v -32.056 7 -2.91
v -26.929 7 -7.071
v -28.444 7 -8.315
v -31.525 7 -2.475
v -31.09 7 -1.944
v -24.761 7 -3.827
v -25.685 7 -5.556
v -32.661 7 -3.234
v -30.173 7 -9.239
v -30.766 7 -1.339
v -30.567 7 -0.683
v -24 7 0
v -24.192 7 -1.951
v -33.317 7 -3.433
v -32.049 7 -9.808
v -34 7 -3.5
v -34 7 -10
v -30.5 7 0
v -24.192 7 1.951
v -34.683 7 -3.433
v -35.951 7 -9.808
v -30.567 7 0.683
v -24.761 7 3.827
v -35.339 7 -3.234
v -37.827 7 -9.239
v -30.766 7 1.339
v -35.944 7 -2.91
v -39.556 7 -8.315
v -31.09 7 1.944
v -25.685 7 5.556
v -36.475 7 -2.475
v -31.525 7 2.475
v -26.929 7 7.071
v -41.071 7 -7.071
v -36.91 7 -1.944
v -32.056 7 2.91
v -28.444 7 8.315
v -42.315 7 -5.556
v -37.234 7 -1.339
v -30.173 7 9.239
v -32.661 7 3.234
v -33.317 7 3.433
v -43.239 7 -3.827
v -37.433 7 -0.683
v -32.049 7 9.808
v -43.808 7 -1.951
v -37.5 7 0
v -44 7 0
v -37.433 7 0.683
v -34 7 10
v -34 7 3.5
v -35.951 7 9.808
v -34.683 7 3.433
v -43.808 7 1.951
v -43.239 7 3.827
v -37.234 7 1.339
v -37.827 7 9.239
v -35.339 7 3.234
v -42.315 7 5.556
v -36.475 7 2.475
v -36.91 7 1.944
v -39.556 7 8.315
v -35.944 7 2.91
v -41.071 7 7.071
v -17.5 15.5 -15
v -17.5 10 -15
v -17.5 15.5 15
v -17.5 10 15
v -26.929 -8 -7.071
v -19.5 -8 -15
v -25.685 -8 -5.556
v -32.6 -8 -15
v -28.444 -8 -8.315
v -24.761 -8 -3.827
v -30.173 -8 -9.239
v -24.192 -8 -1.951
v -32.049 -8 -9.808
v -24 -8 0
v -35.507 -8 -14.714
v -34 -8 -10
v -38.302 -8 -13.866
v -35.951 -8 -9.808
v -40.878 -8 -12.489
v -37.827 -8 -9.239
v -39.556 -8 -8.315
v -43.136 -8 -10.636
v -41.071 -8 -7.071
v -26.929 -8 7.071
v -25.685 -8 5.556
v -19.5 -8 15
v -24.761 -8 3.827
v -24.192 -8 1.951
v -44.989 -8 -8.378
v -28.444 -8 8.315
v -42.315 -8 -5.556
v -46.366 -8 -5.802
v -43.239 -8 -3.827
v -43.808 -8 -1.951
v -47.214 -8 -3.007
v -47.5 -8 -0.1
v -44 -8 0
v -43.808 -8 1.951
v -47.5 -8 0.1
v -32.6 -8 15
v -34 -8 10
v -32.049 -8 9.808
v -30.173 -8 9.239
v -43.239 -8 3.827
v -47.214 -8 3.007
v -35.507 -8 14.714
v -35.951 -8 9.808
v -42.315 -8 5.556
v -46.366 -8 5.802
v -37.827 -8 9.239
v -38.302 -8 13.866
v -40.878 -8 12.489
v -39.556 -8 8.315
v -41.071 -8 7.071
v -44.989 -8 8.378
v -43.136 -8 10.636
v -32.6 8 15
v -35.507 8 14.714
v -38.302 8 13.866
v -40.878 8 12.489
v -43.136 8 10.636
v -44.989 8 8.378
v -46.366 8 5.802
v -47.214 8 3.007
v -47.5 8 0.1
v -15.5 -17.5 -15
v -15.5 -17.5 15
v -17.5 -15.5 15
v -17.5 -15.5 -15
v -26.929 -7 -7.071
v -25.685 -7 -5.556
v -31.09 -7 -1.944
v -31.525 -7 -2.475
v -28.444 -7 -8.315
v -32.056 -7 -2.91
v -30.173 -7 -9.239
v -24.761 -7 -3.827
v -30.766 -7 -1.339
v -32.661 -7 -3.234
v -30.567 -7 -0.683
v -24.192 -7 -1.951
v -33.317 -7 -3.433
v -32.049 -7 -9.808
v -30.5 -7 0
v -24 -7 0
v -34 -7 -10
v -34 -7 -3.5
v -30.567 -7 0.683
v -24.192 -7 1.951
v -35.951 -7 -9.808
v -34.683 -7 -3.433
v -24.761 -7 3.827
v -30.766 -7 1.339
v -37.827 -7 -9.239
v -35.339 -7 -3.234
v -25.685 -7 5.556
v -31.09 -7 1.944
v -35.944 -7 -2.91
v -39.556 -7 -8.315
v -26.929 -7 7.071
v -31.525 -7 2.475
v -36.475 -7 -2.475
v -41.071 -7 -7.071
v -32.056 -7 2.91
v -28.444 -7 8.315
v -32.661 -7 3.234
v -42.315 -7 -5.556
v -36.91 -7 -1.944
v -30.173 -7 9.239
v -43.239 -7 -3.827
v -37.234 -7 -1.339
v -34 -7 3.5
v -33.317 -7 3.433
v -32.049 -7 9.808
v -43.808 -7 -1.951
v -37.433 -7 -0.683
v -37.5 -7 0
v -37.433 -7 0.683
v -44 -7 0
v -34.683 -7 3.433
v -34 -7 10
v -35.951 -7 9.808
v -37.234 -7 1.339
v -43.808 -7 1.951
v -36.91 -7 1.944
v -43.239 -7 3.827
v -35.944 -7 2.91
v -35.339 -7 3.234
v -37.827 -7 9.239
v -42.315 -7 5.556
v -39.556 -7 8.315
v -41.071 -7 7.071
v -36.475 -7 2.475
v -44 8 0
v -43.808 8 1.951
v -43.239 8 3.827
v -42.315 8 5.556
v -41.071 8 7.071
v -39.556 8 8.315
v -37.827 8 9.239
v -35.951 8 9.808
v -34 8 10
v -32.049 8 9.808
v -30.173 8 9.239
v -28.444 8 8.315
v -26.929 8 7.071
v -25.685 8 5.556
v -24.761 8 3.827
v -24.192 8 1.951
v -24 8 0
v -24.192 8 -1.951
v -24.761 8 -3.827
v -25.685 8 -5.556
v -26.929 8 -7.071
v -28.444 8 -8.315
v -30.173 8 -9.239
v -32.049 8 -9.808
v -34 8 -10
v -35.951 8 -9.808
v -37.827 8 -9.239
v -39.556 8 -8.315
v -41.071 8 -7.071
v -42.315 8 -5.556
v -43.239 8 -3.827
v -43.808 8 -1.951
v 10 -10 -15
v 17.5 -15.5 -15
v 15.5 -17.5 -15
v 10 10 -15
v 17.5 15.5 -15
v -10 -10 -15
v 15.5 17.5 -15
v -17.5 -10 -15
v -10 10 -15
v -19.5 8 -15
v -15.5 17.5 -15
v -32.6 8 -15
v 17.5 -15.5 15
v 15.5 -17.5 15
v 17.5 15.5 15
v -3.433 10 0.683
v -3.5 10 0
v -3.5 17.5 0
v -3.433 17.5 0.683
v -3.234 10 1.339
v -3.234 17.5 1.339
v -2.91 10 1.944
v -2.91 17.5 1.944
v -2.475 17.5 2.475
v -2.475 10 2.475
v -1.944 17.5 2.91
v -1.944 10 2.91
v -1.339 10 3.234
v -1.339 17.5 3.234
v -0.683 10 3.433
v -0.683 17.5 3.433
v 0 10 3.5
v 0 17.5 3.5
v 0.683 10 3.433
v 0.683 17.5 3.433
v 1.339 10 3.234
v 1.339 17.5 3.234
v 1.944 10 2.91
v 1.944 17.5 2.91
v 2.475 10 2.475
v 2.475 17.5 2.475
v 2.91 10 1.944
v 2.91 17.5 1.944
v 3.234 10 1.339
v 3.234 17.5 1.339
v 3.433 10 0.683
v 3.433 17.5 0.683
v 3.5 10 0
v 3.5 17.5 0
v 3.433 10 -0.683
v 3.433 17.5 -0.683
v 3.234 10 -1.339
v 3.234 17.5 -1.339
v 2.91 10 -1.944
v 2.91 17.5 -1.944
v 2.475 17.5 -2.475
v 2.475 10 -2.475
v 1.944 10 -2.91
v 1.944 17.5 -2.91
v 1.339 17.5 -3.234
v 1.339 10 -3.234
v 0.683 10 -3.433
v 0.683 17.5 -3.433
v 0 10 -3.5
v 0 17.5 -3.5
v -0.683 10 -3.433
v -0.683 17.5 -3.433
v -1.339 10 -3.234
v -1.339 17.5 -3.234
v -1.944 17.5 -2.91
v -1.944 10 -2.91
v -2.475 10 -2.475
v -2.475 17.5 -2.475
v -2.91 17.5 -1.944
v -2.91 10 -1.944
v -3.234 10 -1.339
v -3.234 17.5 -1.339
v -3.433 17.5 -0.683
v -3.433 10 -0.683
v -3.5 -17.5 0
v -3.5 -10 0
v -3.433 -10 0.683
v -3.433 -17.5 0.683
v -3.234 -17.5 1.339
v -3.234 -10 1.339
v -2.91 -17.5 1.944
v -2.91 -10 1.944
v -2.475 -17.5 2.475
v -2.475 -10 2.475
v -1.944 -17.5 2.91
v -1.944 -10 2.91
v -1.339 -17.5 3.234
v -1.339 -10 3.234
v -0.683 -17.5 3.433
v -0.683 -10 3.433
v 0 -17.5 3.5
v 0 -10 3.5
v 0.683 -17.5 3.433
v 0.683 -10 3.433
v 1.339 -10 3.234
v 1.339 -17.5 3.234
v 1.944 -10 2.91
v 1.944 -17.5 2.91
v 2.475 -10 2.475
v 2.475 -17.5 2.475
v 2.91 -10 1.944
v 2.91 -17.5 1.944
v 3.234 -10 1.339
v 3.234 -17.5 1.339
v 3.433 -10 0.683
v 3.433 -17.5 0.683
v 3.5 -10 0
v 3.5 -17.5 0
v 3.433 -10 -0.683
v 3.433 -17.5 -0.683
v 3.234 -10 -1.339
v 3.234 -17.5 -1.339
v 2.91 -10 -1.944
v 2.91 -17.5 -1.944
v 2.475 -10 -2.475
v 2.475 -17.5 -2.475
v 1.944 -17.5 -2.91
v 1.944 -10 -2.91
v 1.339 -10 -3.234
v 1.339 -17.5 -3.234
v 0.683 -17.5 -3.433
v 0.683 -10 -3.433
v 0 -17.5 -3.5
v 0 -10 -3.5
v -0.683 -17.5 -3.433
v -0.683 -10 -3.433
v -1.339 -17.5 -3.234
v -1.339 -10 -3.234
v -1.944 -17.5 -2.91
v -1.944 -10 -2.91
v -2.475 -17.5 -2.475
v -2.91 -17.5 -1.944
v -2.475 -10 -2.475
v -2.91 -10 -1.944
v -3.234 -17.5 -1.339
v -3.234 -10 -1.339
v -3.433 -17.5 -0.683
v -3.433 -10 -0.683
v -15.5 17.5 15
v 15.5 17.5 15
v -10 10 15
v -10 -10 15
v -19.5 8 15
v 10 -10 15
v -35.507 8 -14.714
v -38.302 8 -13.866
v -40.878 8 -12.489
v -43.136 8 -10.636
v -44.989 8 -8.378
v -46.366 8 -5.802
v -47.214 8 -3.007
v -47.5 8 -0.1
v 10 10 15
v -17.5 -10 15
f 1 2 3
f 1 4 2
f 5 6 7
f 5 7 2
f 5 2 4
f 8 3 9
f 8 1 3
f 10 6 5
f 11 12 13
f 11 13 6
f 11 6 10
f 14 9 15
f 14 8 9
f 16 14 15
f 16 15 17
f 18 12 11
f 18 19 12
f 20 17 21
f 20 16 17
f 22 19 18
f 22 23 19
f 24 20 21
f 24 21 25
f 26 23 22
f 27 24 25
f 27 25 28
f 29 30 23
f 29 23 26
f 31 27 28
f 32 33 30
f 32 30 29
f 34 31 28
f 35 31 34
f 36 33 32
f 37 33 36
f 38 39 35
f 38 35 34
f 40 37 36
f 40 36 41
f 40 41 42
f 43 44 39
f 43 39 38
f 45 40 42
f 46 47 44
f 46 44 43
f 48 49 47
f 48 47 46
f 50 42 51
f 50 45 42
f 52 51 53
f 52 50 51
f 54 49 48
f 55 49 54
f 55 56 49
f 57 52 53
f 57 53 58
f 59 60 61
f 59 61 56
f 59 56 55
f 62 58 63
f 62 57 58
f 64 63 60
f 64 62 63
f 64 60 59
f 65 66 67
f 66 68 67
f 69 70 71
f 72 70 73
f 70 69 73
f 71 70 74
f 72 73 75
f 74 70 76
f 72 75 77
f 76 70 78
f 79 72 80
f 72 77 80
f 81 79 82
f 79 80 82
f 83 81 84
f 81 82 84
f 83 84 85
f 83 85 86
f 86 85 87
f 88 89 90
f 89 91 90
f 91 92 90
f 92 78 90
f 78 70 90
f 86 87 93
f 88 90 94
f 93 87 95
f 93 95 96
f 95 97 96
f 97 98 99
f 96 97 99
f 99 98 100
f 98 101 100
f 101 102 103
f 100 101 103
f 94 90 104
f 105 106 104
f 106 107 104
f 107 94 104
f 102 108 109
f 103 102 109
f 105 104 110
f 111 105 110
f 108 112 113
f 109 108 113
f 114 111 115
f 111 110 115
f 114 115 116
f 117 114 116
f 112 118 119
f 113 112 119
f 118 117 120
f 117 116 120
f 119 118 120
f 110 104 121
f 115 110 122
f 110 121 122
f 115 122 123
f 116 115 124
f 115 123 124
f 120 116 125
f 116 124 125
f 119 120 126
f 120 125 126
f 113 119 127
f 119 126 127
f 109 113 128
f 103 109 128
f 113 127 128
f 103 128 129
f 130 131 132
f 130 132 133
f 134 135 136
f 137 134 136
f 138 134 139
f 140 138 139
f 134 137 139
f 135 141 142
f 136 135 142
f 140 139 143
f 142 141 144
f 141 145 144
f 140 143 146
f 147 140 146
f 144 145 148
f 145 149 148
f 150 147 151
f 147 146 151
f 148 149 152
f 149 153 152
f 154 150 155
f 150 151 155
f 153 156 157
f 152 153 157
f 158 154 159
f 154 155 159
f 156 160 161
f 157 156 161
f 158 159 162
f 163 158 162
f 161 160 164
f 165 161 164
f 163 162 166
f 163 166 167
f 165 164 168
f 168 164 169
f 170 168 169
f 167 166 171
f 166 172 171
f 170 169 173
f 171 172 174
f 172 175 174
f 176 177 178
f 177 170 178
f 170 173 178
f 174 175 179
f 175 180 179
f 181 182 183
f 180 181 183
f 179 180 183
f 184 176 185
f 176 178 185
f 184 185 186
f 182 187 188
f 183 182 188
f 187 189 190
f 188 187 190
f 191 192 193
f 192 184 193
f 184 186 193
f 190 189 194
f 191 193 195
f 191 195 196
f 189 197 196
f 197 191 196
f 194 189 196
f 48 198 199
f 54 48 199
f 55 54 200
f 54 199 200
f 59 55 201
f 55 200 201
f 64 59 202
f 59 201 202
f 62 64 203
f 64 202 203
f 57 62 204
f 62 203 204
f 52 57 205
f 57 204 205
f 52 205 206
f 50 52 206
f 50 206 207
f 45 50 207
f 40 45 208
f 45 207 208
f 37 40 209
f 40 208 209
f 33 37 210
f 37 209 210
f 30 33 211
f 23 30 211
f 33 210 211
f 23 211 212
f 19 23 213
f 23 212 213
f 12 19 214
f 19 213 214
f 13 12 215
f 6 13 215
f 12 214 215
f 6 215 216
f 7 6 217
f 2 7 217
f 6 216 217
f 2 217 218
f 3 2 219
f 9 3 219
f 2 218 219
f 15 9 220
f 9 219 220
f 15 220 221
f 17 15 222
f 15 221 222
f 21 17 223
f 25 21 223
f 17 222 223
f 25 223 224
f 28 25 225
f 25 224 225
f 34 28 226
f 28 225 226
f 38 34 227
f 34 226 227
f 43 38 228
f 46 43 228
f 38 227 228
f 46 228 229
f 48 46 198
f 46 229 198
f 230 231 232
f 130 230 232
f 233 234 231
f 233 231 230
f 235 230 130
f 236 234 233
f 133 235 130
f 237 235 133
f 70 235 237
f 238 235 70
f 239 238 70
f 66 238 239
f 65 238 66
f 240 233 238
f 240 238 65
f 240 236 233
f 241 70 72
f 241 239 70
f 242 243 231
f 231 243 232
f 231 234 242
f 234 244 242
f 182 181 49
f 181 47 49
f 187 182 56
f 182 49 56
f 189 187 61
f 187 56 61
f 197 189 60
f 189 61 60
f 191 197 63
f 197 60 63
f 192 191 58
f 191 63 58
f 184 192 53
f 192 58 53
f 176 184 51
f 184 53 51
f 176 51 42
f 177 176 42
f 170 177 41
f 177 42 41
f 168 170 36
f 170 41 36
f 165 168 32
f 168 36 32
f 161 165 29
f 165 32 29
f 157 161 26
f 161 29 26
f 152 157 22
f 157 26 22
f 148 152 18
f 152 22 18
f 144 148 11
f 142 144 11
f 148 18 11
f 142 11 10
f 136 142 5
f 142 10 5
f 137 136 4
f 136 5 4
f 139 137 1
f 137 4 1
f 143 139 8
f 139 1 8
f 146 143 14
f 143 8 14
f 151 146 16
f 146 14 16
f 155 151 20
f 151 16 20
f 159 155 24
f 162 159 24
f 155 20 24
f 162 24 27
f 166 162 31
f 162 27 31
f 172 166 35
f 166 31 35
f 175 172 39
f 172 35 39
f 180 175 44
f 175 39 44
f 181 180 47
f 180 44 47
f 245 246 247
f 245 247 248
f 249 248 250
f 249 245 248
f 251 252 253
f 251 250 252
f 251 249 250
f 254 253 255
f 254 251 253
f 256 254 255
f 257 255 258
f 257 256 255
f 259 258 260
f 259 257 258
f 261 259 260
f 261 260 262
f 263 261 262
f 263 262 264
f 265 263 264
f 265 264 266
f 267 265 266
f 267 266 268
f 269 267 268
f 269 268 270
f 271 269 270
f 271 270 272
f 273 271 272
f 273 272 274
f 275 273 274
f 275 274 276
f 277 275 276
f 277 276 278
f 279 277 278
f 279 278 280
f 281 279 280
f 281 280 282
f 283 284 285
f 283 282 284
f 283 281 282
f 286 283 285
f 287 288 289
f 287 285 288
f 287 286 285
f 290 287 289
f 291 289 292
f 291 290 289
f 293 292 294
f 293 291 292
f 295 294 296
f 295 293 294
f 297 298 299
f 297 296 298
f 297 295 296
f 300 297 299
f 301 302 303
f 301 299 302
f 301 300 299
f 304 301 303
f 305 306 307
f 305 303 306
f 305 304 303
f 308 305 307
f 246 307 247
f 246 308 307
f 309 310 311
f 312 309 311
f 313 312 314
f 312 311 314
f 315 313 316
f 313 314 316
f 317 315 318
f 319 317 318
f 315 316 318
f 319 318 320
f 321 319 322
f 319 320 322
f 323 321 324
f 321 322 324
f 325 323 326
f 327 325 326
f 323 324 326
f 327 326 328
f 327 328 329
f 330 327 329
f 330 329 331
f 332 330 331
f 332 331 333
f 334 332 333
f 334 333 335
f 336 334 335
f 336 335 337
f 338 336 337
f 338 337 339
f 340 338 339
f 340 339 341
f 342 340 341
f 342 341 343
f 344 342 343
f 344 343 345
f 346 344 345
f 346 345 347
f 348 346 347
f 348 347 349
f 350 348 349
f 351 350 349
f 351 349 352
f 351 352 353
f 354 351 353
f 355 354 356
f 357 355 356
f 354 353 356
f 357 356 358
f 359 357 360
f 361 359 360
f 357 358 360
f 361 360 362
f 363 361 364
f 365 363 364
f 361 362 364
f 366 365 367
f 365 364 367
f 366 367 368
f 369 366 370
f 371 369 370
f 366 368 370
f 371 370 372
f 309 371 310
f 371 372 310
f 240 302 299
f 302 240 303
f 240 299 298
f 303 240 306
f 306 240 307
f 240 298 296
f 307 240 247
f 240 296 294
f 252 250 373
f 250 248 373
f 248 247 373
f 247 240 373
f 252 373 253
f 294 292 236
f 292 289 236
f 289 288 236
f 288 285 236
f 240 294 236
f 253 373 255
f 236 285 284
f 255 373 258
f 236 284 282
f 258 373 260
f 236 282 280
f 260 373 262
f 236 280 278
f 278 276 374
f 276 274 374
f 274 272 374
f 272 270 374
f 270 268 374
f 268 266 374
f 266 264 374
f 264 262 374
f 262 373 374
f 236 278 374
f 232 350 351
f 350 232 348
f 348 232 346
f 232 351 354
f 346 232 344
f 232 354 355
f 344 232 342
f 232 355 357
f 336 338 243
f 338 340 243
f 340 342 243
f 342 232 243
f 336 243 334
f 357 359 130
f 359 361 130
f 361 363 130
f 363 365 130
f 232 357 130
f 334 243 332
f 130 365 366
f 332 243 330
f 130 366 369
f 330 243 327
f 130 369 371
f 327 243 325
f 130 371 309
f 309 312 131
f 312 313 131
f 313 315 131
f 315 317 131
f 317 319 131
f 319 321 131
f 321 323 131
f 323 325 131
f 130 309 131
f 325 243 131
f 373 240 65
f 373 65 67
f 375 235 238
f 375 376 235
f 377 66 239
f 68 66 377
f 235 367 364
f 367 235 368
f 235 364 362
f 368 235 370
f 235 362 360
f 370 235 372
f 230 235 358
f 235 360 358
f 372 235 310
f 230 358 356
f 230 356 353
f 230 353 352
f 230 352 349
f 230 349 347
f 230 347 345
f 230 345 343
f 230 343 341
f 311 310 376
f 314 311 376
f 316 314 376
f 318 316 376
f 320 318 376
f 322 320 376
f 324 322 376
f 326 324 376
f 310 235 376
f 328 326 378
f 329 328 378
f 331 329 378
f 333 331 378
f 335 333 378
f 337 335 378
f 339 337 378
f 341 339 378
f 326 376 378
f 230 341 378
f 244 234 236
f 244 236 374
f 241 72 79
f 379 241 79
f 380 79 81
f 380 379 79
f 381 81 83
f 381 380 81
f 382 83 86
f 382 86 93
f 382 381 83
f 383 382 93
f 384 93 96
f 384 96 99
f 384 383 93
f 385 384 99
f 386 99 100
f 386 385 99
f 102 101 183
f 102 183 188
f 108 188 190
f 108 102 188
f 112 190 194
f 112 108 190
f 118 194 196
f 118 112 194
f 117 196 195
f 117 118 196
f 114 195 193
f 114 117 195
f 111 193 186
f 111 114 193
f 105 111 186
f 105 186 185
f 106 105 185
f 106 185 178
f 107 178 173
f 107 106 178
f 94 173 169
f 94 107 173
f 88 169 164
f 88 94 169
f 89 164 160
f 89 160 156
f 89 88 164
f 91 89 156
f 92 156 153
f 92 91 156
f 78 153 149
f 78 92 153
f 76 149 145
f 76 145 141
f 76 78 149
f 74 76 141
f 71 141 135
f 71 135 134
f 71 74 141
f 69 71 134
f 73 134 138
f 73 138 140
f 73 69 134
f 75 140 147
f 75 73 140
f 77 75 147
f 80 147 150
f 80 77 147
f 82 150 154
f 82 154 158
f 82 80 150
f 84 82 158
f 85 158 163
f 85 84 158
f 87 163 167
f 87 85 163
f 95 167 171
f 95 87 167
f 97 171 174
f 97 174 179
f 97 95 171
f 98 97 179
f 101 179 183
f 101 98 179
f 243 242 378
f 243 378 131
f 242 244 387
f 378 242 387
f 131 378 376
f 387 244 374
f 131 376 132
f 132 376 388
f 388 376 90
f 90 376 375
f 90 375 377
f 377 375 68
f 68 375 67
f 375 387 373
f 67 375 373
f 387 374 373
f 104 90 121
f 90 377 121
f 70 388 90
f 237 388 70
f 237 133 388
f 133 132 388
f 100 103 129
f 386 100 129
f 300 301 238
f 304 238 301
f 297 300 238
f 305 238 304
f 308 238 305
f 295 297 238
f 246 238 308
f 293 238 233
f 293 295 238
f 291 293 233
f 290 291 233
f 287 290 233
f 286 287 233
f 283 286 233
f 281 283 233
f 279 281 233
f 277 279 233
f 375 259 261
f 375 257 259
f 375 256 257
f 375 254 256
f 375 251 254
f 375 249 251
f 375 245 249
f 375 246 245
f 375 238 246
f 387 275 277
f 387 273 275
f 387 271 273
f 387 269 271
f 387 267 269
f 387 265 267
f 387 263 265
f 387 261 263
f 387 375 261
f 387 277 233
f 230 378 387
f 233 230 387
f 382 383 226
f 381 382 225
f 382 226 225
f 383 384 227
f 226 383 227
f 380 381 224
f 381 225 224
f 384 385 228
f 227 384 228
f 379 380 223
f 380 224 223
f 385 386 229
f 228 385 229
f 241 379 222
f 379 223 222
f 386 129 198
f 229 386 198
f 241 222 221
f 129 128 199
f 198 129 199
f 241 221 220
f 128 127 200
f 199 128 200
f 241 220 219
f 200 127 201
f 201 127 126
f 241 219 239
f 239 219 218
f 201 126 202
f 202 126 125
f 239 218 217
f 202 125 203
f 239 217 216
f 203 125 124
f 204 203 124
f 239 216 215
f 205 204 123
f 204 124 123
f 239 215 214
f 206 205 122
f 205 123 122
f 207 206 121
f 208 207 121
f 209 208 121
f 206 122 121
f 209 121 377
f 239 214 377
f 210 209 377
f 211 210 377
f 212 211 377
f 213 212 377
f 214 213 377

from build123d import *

# Parameters (mm, degrees)
SKETCH_W          = 20
SKETCH_H          = 20
PAD_DEPTH         = 15
SKETCH002_R       = 3.5
POCKET_DEPTH      = 17.501
POCKET_DEPTH_BACK = -17.501
SKETCH001_R       = 10
POCKET001_DEPTH   = 1
SKETCH003_R       = 10
POCKET002_DEPTH   = 1
FILLET_R          = 14.9
CHAMFER_SIZE      = 2


with BuildPart() as part:
    # Sketch → Pad (new body, symmetric)
    with BuildSketch(Plane.XY):
        Polygon((17.5, 17.5), (17.5, -17.5), (-17.5, -17.5), (-17.5, -8), (-47.5, -8), (-47.5, 8), (-17.5, 8), (-17.5, 17.5), align=None)
        Rectangle(SKETCH_W, SKETCH_H, mode=Mode.SUBTRACT)
    extrude(amount=PAD_DEPTH, both=True)

    # Sketch002 → Pocket (cut, two sides)
    with BuildSketch(Plane(origin=(0, 0, 0), x_dir=(-1, 0, 0), z_dir=(0, 1, 0))) as pocket_sk:
        with Locations((34, 0)):
            Circle(SKETCH002_R)
        Circle(SKETCH002_R)
    extrude(amount=-POCKET_DEPTH, mode=Mode.SUBTRACT)
    extrude(pocket_sk.sketch, amount=-POCKET_DEPTH_BACK, mode=Mode.SUBTRACT)

    # Sketch001 (on Face6 of Pad) → Pocket001 (cut)
    with BuildSketch(Plane(origin=(0, 8, 0), x_dir=(-1, 0, 0), z_dir=(0, 1, 0))):
        with Locations((34, 0)):
            Circle(SKETCH001_R)
    extrude(amount=-POCKET001_DEPTH, mode=Mode.SUBTRACT)

    # Sketch003 (on Face4 of Pad) → Pocket002 (cut)
    with BuildSketch(Plane(origin=(0, -8, 0), x_dir=(-1, 0, 0), z_dir=(0, 1, 0))):
        with Locations((34, 0)):
            Circle(SKETCH003_R)
    extrude(amount=POCKET002_DEPTH, mode=Mode.SUBTRACT)

    # Fillet
    fillet_edges = [part.edges().sort_by_distance(p)[0] for p in [
        (-47.5, 0, 15),
        (-47.5, 0, -15),
    ]]
    fillet(fillet_edges, radius=FILLET_R)

    # Chamfer
    chamfer_edges = [part.edges().sort_by_distance(p)[0] for p in [
        (17.5, -17.5, 0),
        (-17.5, -17.5, 0),
        (-17.5, -8, 0),
        (-17.5, 8, 0),
        (17.5, 17.5, 0),
        (-17.5, 17.5, 0),
    ]]
    chamfer(chamfer_edges, length=CHAMFER_SIZE)


solid = part.part
